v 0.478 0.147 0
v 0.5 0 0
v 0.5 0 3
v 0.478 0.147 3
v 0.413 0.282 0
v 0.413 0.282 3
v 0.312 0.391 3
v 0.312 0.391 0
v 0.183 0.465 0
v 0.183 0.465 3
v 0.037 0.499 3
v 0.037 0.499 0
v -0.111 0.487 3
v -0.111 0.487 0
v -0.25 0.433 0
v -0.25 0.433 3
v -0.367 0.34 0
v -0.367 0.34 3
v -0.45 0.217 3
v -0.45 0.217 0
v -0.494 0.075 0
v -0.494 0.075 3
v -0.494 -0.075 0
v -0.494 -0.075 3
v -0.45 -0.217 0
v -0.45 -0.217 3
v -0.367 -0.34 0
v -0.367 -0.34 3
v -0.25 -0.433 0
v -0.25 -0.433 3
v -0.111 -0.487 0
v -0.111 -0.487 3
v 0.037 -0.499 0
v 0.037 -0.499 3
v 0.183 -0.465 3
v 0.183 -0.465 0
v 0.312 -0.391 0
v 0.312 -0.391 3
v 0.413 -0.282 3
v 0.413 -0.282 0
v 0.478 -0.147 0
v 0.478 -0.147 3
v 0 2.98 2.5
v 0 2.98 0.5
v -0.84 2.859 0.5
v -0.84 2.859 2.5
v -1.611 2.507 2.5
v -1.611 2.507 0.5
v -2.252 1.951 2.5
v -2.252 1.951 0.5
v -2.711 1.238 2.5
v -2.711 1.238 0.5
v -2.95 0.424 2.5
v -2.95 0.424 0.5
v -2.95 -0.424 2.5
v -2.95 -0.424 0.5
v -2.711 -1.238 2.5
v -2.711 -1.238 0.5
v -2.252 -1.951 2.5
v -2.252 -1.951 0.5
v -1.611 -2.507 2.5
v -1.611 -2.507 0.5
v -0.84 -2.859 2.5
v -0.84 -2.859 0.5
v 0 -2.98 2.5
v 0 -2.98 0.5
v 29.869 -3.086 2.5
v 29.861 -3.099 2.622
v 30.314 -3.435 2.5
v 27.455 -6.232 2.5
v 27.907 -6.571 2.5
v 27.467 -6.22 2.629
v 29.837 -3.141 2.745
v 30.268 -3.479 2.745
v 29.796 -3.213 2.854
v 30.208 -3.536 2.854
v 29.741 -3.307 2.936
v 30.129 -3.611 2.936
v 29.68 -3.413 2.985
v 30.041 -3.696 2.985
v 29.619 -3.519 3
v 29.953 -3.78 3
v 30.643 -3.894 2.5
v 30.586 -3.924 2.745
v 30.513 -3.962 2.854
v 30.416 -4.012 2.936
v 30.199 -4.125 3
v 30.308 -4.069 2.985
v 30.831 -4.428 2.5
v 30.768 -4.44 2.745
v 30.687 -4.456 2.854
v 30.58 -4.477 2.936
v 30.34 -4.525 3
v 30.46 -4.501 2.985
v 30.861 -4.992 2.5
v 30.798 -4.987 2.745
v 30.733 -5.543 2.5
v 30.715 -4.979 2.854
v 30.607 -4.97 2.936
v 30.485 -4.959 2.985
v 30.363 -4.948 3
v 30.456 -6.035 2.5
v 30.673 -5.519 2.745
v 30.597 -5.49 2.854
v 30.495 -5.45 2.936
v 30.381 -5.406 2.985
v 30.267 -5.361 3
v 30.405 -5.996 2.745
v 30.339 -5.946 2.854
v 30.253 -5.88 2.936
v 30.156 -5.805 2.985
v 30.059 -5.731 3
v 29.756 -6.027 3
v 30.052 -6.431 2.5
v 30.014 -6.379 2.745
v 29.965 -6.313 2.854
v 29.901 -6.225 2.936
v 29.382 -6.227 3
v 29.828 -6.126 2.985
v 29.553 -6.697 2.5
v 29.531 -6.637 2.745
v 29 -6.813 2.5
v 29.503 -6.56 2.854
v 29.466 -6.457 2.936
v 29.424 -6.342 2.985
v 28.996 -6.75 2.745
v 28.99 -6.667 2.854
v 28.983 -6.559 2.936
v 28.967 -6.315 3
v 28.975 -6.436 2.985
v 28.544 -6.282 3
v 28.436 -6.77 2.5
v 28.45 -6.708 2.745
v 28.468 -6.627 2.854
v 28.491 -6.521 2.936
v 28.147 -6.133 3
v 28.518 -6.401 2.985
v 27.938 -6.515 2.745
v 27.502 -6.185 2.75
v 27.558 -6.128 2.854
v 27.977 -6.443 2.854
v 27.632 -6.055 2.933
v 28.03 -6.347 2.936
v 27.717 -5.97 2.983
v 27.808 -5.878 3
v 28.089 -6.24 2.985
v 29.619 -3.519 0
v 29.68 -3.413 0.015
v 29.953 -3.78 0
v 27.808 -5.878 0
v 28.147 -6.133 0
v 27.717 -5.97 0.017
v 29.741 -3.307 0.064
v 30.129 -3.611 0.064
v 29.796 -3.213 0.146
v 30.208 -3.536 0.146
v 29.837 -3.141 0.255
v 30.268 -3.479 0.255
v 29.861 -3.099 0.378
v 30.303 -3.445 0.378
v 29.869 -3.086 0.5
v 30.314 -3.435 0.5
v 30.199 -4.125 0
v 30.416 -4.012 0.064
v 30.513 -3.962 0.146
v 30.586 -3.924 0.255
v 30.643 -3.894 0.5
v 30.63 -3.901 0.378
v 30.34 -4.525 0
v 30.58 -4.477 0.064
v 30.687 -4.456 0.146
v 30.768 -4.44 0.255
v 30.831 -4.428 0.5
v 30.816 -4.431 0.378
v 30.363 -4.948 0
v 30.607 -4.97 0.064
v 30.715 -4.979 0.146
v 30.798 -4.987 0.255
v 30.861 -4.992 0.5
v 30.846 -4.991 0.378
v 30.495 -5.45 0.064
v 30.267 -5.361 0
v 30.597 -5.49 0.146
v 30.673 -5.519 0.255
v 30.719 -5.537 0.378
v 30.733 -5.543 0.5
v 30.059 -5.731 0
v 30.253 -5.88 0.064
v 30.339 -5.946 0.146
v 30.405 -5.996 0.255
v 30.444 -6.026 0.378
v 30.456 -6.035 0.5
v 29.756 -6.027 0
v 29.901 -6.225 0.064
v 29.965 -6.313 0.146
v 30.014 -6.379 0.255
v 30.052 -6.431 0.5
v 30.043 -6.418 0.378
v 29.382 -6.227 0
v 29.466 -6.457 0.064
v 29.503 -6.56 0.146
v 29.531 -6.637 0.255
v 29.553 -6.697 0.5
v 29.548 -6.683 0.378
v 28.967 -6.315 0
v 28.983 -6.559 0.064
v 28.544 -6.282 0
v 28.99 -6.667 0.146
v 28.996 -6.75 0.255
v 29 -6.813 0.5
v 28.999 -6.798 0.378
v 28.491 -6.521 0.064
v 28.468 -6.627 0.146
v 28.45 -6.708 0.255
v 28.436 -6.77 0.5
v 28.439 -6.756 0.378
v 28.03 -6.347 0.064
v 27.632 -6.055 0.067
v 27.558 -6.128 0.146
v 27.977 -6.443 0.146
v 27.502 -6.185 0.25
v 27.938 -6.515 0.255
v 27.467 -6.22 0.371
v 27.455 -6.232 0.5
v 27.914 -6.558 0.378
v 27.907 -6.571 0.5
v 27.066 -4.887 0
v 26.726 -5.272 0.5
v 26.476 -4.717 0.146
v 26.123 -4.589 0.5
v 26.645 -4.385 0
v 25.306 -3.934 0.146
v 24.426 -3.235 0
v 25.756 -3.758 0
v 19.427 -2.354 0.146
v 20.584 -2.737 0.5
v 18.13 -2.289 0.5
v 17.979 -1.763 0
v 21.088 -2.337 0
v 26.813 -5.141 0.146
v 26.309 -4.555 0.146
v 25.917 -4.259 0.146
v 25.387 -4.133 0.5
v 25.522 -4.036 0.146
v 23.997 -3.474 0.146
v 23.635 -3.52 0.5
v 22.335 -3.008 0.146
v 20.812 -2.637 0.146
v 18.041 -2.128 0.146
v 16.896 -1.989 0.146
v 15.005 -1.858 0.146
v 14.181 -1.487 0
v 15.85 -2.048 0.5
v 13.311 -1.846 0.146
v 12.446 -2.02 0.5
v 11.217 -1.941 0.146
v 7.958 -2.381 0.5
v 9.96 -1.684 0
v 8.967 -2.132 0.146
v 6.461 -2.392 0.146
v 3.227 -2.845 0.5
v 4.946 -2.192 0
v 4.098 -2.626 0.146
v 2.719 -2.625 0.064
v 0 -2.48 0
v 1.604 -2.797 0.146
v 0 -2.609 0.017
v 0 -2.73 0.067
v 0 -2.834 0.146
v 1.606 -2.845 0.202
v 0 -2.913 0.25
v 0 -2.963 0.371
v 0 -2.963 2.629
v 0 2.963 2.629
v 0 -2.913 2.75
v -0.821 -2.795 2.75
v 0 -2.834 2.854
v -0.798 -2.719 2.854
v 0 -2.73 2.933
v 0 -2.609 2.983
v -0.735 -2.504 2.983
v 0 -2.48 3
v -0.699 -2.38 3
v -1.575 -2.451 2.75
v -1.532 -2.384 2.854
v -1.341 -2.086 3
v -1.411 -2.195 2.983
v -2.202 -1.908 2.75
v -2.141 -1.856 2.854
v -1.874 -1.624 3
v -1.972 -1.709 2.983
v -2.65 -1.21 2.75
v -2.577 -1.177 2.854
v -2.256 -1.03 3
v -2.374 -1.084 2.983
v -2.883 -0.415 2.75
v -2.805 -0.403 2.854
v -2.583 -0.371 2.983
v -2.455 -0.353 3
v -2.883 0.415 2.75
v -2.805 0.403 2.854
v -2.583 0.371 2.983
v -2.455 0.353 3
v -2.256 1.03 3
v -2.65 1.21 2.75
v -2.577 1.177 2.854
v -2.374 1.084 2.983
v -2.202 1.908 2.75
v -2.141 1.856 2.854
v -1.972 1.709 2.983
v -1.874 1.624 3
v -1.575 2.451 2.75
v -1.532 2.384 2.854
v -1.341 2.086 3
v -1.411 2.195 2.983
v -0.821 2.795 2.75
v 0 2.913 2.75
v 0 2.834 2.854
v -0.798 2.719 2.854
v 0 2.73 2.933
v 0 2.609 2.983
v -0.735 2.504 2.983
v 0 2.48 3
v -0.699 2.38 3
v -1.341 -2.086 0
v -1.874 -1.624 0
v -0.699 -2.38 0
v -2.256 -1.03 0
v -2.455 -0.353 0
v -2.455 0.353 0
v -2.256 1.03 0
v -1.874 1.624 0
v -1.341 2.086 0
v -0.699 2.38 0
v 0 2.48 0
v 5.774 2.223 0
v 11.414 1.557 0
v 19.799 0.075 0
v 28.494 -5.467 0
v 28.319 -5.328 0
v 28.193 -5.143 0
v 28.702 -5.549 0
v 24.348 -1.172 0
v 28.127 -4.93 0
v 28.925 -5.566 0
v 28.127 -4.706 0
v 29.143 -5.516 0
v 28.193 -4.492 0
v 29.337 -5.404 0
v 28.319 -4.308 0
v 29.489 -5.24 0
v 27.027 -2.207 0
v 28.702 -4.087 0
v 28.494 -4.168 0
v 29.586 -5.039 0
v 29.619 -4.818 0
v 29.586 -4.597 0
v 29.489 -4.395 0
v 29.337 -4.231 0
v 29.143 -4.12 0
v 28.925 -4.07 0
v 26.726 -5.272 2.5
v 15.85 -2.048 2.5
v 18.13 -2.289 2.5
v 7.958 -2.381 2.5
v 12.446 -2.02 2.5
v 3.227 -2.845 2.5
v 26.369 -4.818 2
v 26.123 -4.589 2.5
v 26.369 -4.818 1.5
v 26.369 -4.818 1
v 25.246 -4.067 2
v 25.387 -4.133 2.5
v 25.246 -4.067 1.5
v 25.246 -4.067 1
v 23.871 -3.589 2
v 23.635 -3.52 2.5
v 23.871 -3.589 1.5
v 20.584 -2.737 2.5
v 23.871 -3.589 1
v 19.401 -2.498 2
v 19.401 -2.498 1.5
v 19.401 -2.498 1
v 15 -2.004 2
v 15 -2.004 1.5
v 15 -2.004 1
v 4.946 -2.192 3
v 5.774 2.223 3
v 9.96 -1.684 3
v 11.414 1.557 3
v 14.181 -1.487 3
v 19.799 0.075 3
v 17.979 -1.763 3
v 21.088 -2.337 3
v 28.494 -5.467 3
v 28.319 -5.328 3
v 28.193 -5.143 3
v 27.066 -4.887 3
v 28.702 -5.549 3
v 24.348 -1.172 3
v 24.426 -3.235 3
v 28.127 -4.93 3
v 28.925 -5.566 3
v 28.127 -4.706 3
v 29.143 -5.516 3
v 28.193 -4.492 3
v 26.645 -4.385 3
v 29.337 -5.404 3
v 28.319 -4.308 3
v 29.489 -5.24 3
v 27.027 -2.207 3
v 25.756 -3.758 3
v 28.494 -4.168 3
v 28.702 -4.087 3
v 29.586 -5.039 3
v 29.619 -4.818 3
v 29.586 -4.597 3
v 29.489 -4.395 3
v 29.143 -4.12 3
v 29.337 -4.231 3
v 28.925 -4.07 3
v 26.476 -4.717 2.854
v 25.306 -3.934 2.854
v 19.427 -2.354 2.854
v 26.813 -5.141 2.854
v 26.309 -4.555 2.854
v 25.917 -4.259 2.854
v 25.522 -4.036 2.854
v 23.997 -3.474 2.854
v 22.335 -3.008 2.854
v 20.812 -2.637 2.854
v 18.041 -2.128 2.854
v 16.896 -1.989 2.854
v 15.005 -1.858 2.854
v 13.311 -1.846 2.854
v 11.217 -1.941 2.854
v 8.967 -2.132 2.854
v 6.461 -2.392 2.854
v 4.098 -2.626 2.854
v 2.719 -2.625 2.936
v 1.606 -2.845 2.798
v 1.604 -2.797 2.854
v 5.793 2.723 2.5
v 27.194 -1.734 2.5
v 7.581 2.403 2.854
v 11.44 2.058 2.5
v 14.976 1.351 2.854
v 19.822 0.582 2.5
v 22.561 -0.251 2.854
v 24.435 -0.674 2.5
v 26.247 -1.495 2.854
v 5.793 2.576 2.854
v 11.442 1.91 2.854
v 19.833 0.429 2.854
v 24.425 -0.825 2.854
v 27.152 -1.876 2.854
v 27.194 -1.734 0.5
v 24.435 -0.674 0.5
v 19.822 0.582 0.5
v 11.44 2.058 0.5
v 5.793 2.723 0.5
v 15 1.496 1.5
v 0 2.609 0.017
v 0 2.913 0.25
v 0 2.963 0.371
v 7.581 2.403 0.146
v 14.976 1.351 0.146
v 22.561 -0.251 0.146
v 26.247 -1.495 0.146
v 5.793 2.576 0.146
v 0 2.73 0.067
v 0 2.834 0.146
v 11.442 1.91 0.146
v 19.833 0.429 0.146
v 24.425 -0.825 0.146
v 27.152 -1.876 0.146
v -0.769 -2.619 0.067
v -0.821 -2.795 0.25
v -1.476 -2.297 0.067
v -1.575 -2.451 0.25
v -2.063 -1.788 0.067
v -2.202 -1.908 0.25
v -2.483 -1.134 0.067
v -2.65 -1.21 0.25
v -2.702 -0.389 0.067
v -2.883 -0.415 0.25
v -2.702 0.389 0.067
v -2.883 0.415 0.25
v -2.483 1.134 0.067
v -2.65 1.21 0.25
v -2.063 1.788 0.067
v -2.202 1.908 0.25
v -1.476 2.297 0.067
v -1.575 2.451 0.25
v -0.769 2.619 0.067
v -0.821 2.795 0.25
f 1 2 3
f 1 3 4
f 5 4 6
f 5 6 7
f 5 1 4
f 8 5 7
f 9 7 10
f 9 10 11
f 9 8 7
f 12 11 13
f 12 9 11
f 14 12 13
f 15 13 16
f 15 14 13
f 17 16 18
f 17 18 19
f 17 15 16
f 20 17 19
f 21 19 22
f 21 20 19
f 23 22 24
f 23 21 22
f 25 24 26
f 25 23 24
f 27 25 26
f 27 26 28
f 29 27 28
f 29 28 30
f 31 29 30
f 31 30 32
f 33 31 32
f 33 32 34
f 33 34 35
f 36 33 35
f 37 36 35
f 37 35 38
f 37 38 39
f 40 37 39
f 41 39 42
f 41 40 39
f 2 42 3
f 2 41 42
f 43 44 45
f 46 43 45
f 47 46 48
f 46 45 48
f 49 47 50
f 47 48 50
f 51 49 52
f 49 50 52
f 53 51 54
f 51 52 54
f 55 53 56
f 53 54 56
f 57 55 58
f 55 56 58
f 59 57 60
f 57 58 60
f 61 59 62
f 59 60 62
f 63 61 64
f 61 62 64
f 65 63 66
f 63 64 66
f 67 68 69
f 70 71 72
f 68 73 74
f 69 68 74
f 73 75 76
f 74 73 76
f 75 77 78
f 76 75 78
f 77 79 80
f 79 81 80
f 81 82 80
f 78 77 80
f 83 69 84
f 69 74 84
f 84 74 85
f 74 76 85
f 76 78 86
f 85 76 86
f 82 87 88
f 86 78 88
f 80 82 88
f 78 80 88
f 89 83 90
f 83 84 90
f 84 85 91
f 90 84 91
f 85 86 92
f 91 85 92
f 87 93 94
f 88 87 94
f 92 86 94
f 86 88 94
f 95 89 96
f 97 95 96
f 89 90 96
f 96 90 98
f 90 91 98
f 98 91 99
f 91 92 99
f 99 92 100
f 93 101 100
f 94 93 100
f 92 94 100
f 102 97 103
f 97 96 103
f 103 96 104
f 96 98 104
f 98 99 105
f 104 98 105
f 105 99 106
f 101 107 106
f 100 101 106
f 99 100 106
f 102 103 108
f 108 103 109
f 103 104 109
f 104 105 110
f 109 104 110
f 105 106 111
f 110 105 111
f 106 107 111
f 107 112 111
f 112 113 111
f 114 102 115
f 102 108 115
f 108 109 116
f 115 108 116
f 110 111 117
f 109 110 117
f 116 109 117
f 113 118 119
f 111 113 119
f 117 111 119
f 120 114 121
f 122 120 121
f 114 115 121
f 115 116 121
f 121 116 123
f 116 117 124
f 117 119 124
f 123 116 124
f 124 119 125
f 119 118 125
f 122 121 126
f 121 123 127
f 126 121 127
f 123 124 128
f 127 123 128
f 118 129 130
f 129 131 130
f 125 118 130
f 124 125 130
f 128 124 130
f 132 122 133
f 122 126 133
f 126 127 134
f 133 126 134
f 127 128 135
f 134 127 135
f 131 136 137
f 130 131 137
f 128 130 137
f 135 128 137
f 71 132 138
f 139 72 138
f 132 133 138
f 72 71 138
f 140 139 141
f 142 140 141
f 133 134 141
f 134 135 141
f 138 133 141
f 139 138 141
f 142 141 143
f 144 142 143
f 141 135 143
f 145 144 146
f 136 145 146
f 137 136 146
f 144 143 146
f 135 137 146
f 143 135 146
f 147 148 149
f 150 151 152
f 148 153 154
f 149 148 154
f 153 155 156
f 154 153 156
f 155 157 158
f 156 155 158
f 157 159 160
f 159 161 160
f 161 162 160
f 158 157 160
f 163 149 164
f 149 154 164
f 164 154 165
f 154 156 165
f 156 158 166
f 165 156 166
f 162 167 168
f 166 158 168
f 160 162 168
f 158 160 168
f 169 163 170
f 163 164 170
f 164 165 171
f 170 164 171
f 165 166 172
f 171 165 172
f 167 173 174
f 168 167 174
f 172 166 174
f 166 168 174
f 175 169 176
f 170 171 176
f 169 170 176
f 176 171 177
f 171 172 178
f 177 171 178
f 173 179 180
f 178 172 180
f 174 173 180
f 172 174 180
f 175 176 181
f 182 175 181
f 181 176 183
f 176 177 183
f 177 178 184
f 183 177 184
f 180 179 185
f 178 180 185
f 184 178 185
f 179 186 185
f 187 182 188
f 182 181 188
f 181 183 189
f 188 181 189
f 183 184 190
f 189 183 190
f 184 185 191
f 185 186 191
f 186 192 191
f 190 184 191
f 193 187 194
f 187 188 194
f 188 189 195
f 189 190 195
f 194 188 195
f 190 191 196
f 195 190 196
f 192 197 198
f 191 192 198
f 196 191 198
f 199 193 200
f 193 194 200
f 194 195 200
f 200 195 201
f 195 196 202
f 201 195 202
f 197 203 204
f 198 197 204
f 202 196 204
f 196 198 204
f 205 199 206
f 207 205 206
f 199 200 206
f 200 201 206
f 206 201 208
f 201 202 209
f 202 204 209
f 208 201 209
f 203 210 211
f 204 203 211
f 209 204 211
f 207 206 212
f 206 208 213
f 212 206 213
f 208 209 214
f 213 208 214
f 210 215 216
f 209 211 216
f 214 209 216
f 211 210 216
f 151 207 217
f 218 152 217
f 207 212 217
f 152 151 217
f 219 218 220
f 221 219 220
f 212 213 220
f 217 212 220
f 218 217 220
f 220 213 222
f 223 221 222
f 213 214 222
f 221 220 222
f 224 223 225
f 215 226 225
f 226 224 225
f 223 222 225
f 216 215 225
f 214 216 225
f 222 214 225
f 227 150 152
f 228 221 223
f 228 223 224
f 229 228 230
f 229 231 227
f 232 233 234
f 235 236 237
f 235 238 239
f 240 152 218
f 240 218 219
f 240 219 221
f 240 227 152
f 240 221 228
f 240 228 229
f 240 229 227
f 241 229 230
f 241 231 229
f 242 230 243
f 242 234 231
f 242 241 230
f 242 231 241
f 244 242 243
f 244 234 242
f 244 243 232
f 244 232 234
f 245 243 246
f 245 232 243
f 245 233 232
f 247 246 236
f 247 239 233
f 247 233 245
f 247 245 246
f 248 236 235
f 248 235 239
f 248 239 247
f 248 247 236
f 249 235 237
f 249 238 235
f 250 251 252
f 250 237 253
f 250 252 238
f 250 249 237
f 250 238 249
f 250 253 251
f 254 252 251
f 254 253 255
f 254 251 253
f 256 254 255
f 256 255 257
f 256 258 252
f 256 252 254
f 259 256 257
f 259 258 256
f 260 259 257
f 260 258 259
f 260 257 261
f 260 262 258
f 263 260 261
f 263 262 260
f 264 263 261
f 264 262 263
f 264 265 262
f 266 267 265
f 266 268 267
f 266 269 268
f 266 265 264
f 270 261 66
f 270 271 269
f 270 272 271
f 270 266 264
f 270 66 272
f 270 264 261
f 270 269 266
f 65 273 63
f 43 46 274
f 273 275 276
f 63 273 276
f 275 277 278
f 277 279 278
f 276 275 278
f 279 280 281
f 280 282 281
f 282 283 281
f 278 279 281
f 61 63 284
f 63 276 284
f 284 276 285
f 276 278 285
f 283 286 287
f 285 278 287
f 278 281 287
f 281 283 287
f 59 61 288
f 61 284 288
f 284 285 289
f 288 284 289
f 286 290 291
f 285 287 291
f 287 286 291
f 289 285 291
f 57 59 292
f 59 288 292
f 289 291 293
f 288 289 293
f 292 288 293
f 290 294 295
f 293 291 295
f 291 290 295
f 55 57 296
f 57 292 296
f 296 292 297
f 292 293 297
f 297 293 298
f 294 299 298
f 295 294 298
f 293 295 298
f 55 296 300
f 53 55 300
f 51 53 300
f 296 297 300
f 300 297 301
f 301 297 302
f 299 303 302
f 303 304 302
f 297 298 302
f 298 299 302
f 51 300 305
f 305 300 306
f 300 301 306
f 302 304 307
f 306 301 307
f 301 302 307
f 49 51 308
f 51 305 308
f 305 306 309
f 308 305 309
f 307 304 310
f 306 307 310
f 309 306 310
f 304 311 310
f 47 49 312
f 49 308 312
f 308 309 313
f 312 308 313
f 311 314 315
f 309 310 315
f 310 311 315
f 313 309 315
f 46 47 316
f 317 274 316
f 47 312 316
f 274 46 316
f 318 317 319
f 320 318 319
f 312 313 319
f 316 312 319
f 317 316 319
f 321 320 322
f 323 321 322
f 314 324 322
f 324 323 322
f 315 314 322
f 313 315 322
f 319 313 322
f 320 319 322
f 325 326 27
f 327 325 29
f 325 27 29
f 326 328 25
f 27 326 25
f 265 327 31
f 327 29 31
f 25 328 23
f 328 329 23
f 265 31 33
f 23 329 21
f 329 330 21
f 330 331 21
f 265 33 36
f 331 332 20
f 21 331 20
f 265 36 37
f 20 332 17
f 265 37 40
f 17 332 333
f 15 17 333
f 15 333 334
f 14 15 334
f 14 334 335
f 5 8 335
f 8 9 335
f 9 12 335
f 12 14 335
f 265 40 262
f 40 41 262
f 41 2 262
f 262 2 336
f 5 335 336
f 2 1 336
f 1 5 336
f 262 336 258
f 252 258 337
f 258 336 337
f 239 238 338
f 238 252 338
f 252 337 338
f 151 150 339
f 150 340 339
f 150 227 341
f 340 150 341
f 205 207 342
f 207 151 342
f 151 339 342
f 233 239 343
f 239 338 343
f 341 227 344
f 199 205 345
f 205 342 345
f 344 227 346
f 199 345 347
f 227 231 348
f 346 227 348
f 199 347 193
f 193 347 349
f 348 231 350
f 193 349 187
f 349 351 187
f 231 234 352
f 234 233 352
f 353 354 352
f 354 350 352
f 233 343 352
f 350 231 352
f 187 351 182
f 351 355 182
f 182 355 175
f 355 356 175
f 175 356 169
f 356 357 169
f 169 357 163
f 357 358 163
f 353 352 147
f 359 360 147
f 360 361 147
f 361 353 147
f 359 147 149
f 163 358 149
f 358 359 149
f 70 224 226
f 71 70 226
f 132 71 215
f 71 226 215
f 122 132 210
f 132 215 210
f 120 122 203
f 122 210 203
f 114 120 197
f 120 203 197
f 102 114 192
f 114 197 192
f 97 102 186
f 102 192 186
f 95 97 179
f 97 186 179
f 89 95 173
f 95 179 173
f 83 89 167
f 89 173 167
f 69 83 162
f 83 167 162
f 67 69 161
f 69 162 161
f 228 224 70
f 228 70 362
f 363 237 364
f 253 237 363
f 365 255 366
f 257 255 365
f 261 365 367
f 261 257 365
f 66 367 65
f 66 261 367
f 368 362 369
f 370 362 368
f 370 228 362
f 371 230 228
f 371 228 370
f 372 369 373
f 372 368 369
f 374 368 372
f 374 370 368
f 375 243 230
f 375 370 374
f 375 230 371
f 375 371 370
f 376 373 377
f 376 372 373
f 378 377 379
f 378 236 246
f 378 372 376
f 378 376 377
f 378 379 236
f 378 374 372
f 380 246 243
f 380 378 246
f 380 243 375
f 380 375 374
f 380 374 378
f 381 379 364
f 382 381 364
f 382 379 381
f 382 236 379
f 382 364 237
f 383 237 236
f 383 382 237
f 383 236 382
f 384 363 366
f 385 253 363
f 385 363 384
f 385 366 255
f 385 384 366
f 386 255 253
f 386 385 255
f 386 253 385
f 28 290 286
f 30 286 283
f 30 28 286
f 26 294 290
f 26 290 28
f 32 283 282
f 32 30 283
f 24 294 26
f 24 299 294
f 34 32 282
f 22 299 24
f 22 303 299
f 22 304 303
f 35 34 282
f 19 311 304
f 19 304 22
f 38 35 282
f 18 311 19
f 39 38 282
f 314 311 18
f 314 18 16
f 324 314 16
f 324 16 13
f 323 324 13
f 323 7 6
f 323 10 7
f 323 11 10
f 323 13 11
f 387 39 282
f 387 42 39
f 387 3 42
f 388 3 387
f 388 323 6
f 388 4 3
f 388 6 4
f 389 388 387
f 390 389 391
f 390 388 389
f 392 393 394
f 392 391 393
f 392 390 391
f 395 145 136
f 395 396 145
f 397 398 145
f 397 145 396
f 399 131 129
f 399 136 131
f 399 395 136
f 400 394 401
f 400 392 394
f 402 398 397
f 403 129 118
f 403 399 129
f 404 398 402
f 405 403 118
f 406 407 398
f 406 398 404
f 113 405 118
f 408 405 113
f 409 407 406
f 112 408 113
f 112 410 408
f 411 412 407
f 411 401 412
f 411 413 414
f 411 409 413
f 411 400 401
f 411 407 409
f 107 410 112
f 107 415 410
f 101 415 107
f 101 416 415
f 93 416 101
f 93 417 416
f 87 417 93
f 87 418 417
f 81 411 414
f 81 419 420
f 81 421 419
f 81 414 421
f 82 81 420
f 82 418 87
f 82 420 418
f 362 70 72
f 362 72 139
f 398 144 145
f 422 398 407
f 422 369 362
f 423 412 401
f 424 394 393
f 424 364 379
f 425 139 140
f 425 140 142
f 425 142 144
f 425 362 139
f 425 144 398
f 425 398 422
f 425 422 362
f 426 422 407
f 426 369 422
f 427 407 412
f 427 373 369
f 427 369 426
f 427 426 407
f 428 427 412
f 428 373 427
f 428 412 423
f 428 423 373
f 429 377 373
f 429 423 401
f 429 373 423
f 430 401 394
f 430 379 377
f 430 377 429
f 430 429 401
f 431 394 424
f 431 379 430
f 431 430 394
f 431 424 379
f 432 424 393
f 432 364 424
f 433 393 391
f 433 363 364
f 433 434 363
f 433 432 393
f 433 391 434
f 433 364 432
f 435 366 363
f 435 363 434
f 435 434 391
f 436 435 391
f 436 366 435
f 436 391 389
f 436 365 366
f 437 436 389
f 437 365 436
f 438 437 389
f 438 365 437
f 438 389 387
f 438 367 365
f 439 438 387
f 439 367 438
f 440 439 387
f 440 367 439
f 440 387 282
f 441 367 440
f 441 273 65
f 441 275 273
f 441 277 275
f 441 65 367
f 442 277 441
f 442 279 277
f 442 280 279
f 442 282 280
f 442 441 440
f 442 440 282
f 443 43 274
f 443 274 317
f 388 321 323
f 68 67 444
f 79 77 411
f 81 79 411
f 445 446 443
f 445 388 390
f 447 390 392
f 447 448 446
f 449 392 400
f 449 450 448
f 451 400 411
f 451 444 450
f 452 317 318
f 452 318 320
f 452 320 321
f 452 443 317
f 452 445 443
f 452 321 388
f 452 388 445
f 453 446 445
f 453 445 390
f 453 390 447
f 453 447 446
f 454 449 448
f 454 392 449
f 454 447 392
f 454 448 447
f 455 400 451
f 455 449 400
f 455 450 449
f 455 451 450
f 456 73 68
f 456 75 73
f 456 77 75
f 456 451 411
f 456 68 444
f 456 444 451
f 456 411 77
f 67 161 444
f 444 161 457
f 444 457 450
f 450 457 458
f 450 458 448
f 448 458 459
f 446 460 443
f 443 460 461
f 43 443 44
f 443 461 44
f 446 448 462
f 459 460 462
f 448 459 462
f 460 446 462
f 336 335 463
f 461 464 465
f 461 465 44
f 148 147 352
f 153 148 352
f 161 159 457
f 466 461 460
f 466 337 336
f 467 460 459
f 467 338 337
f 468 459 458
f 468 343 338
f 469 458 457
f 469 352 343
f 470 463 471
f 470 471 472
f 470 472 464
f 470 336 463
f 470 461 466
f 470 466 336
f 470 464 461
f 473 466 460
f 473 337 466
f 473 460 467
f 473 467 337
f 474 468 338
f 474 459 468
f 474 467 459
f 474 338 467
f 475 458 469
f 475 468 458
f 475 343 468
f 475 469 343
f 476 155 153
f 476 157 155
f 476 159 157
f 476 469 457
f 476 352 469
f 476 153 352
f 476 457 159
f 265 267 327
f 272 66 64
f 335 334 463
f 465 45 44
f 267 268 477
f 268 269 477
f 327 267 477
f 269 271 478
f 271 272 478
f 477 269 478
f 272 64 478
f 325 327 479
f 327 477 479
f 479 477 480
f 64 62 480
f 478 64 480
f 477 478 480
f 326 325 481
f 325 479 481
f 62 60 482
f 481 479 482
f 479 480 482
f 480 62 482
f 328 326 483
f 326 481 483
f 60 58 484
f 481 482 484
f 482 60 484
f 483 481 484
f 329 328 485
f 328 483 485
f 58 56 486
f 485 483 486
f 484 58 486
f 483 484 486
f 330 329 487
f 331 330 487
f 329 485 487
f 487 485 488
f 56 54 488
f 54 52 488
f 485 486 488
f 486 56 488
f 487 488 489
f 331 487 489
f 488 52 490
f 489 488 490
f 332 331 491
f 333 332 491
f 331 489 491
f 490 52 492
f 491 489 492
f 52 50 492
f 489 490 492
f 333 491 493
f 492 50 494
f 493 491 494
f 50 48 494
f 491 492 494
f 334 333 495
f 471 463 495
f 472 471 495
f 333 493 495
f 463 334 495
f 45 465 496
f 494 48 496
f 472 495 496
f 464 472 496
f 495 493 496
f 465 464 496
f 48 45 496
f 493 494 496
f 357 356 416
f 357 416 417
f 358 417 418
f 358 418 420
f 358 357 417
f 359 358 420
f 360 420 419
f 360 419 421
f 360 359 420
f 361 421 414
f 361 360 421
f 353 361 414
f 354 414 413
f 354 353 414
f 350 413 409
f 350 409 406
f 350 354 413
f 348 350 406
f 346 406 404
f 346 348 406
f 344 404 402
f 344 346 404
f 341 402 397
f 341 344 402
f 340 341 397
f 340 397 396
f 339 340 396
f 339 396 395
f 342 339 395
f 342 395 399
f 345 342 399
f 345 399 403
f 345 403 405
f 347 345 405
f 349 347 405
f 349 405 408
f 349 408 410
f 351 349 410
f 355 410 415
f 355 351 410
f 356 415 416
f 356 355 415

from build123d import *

# Parameters (mm, degrees)
CROQUIS1_R              = 0.5
CROQUIS1_R_2            = 0.75
SALIENTE_EXTRUIR1_DEPTH = 3
REDONDEO1_R             = 0.5
REDONDEO2_R             = 0.5


with BuildPart() as part:
    # Croquis1 → Saliente-Extruir1 (new body)
    with BuildSketch(Plane.XY):
        with BuildLine():
            ThreePointArc((0, 2.98), (-2.98, 0), (0, -2.98))
            add(Edge.make_bspline(
                [(27.45476023, -6.231976479), (26.998779658, -5.775995908), (26.376511814, -4.374157261), (21.720268516, -2.867863683), (13.141386563, -1.141319481), (4.979505917, -2.98), (0, -2.98)],
                knots=[0, 0, 0, 0, 0.062319749, 0.159605573, 0.474596605, 1, 1, 1, 1], degree=3))
            ThreePointArc((27.45476023, -6.231976479), (30.455680473, -6.035285775), (29.868973792, -3.08571211))
            add(Edge.make_bspline(
                [(29.868973792, -3.08571211), (25.223510958, -0.403652891), (15.112755473, 1.649400545), (5.186052197, 2.98), (0, 2.98)],
                knots=[0, 0, 0, 0, 0.507924163, 1, 1, 1, 1], degree=3))
        make_face()
        Circle(CROQUIS1_R, mode=Mode.SUBTRACT)
        with Locations((28.868973792, -4.817762917)):
            Circle(CROQUIS1_R_2, mode=Mode.SUBTRACT)
    extrude(amount=SALIENTE_EXTRUIR1_DEPTH)

    # Redondeo1
    redondeo1_edges = [part.edges().sort_by_distance(p)[0] for p in [
        (14.297941991, -1.988348496, 3),
        (30.455680473, -6.035285775, 3),
        (15.273685882, 1.449306751, 3),
        (-2.98, 0, 3),
    ]]
    fillet(redondeo1_edges, radius=REDONDEO1_R)

    # Redondeo2
    redondeo2_edges = [part.edges().sort_by_distance(p)[0] for p in [
        (14.297941991, -1.988348496, 0),
        (-2.98, 0, 0),
        (15.273685882, 1.449306751, 0),
        (30.455680473, -6.035285775, 0),
    ]]
    fillet(redondeo2_edges, radius=REDONDEO2_R)


solid = part.part
